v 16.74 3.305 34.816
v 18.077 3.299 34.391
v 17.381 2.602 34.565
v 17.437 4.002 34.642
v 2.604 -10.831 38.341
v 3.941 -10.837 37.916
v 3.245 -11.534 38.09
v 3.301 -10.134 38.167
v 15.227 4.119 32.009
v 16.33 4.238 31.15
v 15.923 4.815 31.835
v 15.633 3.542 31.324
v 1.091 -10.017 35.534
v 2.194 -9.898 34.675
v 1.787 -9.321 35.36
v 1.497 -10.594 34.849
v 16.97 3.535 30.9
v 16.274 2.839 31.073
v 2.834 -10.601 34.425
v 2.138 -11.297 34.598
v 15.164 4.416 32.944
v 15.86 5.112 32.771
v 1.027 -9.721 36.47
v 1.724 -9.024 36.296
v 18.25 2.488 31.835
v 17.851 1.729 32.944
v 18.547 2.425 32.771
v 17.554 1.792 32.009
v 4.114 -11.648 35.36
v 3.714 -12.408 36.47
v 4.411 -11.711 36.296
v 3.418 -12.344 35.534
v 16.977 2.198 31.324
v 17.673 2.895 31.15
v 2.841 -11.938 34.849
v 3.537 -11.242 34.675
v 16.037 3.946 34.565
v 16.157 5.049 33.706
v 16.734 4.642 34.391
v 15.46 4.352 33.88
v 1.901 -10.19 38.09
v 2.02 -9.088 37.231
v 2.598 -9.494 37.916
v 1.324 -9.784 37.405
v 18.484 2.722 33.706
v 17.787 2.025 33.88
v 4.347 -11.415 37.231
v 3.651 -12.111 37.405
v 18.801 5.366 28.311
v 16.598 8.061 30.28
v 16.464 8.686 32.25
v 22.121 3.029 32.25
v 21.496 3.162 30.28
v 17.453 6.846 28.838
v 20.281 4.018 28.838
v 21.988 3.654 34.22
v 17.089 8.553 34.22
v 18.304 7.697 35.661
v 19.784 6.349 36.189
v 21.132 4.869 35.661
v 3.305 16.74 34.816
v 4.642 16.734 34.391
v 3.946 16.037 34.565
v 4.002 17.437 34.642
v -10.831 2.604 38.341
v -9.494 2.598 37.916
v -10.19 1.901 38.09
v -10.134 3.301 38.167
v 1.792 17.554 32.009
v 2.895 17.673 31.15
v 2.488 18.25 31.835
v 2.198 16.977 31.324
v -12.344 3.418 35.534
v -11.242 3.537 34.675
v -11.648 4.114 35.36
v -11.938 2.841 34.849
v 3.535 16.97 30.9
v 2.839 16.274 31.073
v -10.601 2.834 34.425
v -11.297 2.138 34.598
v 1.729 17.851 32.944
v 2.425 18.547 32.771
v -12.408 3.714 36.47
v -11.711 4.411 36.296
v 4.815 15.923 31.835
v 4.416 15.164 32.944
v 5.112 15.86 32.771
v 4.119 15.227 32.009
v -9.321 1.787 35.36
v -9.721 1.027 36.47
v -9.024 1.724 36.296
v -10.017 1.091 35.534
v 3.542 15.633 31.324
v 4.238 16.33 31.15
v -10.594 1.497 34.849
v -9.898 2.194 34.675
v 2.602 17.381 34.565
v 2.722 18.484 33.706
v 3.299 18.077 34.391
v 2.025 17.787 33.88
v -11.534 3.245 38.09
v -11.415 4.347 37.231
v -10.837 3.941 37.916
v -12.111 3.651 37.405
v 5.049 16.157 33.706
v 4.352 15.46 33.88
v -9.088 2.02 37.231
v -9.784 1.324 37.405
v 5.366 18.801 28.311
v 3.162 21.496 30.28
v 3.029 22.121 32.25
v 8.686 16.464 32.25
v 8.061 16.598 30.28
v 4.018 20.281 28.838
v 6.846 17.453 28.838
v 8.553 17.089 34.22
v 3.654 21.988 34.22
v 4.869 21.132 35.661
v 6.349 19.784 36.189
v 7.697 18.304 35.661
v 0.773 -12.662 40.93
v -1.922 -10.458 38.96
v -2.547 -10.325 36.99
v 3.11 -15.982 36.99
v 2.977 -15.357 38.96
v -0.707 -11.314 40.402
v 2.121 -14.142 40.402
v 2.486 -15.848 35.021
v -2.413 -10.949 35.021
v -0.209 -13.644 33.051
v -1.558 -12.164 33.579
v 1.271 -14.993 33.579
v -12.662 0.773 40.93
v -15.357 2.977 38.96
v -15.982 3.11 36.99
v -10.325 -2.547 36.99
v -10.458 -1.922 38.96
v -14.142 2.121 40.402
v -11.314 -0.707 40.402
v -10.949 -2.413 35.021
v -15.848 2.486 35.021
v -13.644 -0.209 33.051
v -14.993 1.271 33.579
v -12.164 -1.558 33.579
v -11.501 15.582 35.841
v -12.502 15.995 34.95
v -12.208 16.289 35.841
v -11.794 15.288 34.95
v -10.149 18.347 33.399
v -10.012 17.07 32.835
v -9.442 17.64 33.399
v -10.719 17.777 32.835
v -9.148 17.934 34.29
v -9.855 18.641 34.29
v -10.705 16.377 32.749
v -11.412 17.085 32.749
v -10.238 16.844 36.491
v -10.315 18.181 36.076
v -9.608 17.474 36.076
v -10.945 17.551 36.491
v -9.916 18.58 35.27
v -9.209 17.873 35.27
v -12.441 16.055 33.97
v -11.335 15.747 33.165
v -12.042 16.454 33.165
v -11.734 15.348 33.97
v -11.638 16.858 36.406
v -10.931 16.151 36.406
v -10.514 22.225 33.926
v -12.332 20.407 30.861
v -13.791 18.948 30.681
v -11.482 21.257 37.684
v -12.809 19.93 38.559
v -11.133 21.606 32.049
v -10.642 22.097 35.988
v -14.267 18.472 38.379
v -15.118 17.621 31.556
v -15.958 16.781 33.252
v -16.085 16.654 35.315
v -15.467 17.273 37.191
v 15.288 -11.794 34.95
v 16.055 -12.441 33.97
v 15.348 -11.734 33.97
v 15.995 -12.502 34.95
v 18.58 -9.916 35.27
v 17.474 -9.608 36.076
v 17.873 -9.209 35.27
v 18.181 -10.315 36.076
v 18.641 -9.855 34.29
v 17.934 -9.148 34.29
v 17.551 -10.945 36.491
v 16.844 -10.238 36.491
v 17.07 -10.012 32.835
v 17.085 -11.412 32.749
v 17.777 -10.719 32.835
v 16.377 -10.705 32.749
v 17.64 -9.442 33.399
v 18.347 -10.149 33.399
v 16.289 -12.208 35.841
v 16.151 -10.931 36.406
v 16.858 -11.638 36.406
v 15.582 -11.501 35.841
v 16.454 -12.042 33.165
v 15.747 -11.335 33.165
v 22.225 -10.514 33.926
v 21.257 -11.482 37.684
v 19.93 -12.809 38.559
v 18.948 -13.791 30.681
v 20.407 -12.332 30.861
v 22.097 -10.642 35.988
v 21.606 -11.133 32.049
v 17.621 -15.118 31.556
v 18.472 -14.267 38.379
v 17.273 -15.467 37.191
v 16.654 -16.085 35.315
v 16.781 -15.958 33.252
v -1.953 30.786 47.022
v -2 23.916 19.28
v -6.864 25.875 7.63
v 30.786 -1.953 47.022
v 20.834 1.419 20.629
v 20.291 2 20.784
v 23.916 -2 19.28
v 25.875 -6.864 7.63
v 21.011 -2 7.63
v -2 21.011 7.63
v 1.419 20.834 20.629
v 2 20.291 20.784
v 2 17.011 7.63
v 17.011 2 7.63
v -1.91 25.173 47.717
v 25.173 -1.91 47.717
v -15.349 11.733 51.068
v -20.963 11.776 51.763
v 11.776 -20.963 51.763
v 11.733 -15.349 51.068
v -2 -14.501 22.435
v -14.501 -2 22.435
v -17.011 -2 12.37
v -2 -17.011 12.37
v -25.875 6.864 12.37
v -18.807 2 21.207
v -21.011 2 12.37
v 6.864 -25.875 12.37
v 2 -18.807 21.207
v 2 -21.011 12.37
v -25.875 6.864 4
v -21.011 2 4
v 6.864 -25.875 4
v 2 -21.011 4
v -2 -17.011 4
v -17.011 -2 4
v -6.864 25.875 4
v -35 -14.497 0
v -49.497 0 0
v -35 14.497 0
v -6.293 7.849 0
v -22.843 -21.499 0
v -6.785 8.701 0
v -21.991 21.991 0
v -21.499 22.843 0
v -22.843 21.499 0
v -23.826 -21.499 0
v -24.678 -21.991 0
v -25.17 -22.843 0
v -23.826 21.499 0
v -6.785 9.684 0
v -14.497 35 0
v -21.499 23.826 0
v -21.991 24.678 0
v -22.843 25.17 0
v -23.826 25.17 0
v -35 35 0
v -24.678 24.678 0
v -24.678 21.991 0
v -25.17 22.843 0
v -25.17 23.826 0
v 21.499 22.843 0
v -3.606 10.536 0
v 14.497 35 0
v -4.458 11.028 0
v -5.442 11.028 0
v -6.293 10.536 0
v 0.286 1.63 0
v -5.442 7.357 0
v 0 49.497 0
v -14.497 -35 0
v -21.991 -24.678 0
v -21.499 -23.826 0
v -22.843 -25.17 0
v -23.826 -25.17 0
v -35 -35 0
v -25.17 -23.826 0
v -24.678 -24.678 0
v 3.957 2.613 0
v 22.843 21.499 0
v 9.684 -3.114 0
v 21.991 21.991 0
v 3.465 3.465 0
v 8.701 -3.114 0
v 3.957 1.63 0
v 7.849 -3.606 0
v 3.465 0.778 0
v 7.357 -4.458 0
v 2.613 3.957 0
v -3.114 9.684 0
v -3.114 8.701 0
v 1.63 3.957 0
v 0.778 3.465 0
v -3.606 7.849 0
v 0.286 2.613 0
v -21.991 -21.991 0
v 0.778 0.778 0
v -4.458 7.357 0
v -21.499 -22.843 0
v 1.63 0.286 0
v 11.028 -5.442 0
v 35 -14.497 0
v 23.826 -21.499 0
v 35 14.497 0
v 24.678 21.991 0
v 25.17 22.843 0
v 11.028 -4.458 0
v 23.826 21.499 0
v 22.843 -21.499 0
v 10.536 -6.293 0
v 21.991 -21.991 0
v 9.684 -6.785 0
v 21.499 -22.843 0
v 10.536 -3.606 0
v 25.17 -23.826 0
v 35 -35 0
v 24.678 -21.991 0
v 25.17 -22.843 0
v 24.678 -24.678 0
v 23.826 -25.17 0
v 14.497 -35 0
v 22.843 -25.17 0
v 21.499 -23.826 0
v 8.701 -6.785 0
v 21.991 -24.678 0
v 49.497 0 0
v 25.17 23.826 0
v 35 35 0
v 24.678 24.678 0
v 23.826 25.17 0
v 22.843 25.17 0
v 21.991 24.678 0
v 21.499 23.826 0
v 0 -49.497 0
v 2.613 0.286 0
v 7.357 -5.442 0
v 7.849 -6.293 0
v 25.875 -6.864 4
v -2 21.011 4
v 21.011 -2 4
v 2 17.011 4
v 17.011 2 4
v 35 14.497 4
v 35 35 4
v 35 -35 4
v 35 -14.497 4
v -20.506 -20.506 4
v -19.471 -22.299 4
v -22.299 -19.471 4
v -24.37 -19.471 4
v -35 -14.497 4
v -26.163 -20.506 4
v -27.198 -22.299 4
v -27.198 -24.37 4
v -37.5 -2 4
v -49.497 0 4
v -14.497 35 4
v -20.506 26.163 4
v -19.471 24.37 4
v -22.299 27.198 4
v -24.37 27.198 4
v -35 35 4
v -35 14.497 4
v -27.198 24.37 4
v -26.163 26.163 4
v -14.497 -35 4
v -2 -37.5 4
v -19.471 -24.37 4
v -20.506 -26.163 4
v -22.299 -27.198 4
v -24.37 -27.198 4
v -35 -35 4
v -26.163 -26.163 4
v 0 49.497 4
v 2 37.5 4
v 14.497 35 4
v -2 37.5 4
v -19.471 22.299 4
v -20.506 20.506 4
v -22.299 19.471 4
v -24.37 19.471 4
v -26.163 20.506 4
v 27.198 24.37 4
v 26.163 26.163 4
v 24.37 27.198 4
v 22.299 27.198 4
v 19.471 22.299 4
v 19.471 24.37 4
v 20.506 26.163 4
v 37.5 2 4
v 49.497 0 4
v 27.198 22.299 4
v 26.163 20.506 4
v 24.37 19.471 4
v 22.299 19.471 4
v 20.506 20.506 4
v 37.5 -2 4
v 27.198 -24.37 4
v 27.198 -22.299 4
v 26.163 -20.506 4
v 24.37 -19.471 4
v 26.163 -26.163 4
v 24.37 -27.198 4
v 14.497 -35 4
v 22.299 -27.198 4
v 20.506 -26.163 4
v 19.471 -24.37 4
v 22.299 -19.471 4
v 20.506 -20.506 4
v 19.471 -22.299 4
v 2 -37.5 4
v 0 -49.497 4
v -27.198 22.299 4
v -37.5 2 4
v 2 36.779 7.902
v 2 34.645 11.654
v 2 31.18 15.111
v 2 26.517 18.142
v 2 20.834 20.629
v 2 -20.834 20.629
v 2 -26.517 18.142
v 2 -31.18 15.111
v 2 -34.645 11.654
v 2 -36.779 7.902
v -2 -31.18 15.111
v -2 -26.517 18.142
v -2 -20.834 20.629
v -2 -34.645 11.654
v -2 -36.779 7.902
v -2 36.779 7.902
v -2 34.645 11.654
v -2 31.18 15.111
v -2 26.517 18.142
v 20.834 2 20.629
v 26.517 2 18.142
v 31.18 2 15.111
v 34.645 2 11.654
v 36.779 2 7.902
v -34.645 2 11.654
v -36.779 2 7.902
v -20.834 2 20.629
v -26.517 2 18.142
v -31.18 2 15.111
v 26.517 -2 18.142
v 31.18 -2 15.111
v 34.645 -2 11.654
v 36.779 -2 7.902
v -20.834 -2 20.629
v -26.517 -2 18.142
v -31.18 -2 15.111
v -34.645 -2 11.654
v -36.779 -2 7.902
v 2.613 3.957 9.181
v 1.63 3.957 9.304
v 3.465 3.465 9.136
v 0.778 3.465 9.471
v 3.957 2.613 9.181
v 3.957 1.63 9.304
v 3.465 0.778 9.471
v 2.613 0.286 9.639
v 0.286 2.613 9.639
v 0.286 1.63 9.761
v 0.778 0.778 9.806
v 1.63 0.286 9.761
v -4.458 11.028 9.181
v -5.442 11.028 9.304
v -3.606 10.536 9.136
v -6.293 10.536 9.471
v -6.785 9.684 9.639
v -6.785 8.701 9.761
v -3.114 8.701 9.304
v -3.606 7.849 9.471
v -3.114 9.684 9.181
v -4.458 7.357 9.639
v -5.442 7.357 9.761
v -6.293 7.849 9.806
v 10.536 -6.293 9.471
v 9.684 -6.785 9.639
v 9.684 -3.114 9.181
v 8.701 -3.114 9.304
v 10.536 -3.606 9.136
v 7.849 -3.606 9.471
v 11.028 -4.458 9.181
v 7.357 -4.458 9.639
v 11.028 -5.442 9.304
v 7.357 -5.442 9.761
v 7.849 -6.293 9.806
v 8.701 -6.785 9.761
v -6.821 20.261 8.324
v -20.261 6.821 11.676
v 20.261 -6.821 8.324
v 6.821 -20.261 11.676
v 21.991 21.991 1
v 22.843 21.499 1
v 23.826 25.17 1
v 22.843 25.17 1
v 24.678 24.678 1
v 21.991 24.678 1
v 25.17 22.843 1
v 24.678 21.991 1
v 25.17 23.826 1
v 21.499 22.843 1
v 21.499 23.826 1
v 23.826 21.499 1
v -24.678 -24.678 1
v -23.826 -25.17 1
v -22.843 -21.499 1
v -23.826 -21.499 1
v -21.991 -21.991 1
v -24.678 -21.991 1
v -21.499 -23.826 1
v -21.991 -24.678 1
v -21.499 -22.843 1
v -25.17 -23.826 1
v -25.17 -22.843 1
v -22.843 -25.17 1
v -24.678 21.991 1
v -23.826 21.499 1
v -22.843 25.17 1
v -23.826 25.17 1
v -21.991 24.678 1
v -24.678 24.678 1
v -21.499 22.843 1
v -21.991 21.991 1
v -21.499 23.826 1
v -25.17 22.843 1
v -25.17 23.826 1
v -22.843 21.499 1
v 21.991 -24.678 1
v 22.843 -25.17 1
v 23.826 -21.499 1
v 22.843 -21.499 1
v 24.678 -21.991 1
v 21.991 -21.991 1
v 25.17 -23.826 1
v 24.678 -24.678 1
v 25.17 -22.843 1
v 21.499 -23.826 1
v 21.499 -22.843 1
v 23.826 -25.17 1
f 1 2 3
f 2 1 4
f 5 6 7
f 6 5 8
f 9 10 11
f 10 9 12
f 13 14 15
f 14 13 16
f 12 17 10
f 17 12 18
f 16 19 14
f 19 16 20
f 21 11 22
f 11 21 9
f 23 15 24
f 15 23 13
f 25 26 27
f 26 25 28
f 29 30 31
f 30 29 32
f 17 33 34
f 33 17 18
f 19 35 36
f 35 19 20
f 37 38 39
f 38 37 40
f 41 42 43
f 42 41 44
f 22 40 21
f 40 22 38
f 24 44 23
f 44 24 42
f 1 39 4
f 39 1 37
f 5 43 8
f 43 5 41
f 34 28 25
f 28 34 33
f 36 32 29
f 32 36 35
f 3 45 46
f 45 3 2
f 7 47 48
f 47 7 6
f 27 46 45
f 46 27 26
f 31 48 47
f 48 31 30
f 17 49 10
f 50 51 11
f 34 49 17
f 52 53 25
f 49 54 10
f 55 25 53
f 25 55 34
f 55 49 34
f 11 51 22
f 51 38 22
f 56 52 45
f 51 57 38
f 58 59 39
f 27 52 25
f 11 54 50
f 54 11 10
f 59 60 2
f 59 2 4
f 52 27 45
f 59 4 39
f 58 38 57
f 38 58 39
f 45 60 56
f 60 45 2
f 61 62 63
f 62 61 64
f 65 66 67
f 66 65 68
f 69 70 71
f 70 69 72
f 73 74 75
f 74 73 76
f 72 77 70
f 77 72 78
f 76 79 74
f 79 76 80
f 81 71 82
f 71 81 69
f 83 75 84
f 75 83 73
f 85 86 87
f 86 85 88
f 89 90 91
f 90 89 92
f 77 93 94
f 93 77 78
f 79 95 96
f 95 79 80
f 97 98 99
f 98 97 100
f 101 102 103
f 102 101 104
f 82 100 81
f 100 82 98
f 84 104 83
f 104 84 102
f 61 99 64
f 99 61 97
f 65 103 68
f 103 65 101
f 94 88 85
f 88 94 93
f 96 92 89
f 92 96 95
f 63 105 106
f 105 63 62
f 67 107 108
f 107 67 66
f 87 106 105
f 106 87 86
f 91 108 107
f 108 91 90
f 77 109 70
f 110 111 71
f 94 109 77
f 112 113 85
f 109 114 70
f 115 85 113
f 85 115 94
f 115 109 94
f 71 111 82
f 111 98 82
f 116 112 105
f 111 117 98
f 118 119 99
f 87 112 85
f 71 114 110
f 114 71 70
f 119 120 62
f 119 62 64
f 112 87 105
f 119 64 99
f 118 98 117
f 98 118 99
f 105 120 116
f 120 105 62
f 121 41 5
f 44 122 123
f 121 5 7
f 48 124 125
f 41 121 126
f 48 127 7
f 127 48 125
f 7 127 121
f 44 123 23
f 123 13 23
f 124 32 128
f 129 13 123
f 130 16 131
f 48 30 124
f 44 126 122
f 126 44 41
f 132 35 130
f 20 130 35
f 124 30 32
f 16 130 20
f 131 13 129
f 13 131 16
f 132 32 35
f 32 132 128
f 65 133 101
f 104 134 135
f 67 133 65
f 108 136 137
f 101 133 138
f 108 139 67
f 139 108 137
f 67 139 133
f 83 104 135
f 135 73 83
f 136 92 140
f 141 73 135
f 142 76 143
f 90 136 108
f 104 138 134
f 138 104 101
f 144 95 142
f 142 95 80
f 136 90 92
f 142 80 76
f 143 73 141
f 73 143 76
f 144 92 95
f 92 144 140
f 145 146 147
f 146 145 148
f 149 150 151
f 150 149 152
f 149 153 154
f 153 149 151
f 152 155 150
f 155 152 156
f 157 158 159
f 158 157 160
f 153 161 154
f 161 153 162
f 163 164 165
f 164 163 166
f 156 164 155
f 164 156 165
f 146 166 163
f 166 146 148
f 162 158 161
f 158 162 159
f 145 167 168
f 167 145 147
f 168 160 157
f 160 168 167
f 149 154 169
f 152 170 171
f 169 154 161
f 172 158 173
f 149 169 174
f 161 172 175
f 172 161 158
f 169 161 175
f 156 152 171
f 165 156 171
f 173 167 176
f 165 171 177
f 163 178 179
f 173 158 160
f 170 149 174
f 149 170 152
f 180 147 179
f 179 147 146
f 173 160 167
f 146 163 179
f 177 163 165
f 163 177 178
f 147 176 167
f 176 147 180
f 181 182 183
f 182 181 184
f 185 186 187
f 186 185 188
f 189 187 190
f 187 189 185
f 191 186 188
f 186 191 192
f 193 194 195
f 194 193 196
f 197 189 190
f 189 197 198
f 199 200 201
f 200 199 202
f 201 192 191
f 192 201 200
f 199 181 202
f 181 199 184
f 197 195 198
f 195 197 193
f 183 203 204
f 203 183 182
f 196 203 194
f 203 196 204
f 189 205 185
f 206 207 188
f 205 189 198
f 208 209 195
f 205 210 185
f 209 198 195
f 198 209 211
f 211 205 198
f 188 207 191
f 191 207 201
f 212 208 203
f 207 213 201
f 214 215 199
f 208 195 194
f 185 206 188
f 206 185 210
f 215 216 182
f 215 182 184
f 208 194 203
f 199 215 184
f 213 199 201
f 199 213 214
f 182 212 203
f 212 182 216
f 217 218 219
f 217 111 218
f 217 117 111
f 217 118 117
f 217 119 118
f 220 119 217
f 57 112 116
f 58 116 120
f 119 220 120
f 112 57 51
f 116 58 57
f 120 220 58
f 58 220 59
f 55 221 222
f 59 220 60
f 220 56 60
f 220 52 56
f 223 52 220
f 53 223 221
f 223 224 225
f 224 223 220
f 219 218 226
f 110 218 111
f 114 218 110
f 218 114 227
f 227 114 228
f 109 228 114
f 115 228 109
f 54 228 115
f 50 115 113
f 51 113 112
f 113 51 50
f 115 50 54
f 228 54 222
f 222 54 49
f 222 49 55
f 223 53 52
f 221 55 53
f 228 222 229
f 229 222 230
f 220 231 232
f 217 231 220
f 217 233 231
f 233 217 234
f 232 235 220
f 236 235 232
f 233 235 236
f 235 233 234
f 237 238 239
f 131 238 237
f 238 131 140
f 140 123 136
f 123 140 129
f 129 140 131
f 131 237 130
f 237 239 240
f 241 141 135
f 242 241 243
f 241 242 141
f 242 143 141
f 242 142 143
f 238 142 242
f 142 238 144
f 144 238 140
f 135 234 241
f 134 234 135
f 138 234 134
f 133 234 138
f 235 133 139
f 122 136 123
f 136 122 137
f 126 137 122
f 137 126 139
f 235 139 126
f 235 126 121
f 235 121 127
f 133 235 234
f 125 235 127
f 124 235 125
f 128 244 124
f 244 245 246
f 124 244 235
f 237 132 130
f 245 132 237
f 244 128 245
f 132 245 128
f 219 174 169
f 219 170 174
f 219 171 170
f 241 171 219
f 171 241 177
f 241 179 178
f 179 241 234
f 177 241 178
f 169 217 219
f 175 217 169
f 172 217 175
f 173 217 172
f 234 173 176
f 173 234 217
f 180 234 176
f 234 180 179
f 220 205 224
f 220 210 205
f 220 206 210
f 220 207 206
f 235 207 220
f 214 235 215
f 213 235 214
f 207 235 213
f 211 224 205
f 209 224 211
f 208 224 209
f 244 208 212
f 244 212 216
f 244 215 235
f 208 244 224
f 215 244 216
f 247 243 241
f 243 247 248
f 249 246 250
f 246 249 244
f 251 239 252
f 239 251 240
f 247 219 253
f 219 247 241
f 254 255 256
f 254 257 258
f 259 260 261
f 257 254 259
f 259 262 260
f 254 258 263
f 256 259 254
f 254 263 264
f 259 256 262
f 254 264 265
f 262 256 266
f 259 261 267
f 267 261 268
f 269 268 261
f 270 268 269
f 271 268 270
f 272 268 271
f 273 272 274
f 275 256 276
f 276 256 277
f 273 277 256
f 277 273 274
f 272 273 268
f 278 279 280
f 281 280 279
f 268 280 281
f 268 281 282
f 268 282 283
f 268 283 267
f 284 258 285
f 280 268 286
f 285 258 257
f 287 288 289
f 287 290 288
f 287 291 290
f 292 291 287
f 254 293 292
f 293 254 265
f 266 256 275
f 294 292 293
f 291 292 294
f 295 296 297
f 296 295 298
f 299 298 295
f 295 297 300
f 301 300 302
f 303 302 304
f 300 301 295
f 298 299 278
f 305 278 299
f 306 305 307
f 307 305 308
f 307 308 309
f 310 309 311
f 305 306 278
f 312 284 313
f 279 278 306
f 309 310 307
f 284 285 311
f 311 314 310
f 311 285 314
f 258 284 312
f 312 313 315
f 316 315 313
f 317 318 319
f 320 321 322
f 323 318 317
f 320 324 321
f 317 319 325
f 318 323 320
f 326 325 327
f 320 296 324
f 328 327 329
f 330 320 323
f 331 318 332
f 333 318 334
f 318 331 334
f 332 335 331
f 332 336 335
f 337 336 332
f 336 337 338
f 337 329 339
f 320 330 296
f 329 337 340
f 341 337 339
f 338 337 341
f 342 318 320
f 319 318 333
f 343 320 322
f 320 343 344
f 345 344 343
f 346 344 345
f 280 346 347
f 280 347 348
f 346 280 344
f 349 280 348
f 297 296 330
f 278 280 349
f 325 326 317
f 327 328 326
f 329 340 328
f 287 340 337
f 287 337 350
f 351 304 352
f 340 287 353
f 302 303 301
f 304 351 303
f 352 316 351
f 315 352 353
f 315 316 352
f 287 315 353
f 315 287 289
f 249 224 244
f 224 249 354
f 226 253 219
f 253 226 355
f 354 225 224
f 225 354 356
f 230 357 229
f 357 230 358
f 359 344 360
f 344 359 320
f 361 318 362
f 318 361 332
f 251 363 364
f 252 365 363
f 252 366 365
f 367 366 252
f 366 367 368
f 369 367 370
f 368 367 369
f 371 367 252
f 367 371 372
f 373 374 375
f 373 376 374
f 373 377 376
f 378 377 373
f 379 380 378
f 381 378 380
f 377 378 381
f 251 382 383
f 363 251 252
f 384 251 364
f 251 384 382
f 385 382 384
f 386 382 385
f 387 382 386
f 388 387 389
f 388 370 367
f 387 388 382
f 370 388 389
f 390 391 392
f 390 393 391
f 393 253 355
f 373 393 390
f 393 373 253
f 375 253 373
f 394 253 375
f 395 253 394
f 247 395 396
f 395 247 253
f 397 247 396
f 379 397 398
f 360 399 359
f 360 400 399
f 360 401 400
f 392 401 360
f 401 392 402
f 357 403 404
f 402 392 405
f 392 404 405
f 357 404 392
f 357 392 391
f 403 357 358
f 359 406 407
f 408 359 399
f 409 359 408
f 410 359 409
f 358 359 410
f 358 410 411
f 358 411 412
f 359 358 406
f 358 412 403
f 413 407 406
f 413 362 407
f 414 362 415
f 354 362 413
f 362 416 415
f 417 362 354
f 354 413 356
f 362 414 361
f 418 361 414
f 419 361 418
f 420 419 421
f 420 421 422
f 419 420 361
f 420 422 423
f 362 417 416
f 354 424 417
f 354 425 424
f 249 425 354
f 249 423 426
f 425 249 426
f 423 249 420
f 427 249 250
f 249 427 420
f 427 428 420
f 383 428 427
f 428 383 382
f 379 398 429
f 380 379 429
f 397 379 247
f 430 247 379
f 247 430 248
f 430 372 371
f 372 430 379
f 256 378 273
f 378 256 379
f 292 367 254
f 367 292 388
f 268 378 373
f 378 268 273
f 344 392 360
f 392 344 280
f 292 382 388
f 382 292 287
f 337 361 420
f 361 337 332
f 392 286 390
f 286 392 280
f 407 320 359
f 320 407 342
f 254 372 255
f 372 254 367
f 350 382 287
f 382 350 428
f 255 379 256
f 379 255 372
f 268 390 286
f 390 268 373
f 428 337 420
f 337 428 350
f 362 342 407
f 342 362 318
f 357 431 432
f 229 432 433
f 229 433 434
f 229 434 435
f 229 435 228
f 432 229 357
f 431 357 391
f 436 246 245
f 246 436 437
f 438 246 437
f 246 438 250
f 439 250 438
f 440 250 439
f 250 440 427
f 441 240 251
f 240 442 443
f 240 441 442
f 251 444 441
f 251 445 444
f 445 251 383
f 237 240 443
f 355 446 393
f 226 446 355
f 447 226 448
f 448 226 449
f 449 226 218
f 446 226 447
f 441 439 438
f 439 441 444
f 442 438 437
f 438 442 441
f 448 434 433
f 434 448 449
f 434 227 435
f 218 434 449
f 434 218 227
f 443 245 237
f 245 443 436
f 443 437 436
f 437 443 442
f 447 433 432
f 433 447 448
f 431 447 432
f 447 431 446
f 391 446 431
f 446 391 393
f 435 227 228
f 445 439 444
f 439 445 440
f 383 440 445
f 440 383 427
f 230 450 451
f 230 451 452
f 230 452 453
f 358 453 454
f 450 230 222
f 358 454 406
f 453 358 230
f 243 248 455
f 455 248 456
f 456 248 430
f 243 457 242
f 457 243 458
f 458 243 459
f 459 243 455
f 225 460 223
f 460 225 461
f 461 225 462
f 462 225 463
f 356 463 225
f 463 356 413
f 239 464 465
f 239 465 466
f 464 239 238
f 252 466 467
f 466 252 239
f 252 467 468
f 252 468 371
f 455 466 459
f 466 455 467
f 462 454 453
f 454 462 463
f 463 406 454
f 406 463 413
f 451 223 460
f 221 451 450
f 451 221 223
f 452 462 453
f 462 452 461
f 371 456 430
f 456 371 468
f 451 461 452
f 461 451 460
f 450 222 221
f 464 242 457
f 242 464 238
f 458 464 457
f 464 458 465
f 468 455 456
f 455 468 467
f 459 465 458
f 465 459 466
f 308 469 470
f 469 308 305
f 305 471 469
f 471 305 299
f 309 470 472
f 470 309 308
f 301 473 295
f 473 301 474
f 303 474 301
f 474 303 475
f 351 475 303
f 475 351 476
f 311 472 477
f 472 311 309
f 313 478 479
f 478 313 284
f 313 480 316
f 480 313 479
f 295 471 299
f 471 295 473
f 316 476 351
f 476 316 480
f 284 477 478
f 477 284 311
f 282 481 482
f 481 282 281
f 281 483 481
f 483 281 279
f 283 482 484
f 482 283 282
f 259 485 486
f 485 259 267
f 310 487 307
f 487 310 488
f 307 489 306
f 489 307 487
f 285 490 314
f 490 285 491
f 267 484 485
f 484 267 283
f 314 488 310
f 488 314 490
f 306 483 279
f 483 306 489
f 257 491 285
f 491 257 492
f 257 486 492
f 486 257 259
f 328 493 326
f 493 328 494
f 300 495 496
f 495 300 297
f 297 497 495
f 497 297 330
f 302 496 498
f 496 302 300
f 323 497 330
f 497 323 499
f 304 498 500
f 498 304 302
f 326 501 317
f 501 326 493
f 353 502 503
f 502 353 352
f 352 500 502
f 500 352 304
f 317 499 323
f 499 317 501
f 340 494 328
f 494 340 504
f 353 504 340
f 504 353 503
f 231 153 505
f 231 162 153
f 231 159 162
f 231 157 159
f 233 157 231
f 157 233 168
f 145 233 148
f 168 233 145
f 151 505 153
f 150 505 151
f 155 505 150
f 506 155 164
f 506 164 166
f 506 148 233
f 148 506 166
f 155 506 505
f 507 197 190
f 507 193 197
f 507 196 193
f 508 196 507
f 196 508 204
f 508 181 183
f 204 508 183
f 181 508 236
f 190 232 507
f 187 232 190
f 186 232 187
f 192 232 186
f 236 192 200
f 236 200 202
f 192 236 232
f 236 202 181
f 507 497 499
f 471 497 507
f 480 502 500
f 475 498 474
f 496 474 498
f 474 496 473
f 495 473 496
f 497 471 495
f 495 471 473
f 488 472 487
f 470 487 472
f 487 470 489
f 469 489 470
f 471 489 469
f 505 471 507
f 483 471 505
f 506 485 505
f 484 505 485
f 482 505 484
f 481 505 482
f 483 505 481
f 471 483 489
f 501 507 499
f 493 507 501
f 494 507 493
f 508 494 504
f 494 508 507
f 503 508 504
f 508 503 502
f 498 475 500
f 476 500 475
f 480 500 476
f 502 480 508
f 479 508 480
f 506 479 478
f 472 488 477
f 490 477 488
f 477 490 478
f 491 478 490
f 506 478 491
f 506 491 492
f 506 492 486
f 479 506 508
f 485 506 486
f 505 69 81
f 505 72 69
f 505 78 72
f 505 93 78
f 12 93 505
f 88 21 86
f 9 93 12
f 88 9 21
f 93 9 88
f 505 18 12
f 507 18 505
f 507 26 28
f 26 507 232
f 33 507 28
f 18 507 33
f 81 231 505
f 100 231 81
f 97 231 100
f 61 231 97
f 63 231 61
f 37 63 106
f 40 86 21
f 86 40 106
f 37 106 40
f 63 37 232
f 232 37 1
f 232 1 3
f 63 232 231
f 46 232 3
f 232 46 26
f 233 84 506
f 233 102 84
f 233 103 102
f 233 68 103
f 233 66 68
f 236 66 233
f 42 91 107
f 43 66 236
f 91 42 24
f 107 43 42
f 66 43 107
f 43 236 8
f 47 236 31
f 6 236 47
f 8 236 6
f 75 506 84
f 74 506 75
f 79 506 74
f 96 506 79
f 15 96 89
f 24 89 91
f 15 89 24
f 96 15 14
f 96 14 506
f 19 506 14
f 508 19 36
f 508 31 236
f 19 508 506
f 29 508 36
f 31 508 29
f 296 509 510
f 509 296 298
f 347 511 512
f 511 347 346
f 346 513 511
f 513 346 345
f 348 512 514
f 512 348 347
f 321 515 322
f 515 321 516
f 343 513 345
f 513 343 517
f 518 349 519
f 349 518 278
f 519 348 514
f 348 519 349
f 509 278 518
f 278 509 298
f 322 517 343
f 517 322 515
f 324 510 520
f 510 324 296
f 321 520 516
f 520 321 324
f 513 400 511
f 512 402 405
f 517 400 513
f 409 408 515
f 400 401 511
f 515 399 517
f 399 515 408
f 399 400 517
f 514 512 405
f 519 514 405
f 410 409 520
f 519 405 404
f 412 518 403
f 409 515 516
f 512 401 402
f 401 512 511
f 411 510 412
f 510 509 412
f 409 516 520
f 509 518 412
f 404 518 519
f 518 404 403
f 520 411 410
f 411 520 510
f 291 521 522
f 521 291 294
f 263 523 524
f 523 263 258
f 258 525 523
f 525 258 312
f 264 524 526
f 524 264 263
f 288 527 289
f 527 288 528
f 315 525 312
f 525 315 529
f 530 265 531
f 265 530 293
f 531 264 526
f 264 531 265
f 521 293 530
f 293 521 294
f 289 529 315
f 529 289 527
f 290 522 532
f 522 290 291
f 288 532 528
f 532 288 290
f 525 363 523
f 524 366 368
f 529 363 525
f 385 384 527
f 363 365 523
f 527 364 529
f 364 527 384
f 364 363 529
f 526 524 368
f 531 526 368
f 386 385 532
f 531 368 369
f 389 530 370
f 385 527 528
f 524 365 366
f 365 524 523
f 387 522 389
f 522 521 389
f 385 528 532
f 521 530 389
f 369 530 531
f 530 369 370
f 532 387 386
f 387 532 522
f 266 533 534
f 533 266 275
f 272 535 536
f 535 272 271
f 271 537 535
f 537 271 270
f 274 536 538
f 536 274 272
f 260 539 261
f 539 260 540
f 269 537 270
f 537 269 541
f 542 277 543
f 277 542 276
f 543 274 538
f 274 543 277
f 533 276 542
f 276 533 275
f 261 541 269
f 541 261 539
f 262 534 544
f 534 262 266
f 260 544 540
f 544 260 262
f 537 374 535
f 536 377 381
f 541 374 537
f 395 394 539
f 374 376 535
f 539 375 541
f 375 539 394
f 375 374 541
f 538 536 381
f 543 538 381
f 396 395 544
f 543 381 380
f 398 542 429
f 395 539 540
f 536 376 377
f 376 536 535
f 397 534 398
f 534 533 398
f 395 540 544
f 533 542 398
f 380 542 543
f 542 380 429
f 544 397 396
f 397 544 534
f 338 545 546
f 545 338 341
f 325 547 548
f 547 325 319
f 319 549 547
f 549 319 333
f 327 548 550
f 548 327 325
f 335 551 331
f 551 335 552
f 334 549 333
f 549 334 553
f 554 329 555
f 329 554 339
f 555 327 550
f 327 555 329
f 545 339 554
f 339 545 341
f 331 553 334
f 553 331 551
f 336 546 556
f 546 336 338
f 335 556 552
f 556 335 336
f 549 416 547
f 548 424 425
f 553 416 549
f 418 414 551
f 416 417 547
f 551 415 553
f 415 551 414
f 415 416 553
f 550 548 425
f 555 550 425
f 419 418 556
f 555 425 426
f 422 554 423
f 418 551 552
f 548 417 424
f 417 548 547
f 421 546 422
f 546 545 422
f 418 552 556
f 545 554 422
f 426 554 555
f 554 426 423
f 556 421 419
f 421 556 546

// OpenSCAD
union() {
	difference() {
		union() {
			union() {
				union() {
					translate(v = [0, 0, 10]) {
						rotate(a = 45, v = [0, 0, 1]) {
							rotate(a = 10, v = [0, 1, 0]) {
								difference() {
									translate(v = [-13.6500000000, -23.1500000000, 0]) {
										cube(size = [27.3000000000, 46.3000000000, 40]);
									}
									union() {
										translate(v = [9.6500000000, -9.5000000000, 25]) {
											rotate(a = 90, v = [0, 1, 0]) {
												union() {
													union() {
														translate(v = [0, 0, -12]) {
															cylinder($fn = 12, h = 16, r = 1.9000000000);
														}
														translate(v = [0, 0, 1]) {
															cylinder($fn = 12, h = 3, r1 = 1.9000000000, r2 = 4);
														}
													}
													translate(v = [0, 0, 4]) {
														cylinder($fn = 12, h = 3, r = 4);
													}
												}
											}
										}
										translate(v = [9.6500000000, 9.5000000000, 25]) {
											rotate(a = 90, v = [0, 1, 0]) {
												union() {
													union() {
														translate(v = [0, 0, -12]) {
															cylinder($fn = 12, h = 16, r = 1.9000000000);
														}
														translate(v = [0, 0, 1]) {
															cylinder($fn = 12, h = 3, r1 = 1.9000000000, r2 = 4);
														}
													}
													translate(v = [0, 0, 4]) {
														cylinder($fn = 12, h = 3, r = 4);
													}
												}
											}
										}
										translate(v = [-9.6500000000, -9.5000000000, 25]) {
											rotate(a = -90, v = [0, 1, 0]) {
												union() {
													union() {
														translate(v = [0, 0, -12]) {
															cylinder($fn = 12, h = 16, r = 1.9000000000);
														}
														translate(v = [0, 0, 1]) {
															cylinder($fn = 12, h = 3, r1 = 1.9000000000, r2 = 4);
														}
													}
													translate(v = [0, 0, 4]) {
														cylinder($fn = 12, h = 3, r = 4);
													}
												}
											}
										}
										translate(v = [-9.6500000000, 9.5000000000, 25]) {
											rotate(a = -90, v = [0, 1, 0]) {
												union() {
													union() {
														translate(v = [0, 0, -12]) {
															cylinder($fn = 12, h = 16, r = 1.9000000000);
														}
														translate(v = [0, 0, 1]) {
															cylinder($fn = 12, h = 3, r1 = 1.9000000000, r2 = 4);
														}
													}
													translate(v = [0, 0, 4]) {
														cylinder($fn = 12, h = 3, r = 4);
													}
												}
											}
										}
										translate(v = [0, 19.1500000000, 25]) {
											rotate(a = -90, v = [1, 0, 0]) {
												union() {
													union() {
														translate(v = [0, 0, -12]) {
															cylinder($fn = 12, h = 16, r = 1.9000000000);
														}
														translate(v = [0, 0, 1]) {
															cylinder($fn = 12, h = 3, r1 = 1.9000000000, r2 = 4);
														}
													}
													translate(v = [0, 0, 4]) {
														cylinder($fn = 12, h = 3, r = 4);
													}
												}
											}
										}
										translate(v = [0, -19.1500000000, 25]) {
											rotate(a = 90, v = [1, 0, 0]) {
												union() {
													union() {
														translate(v = [0, 0, -12]) {
															cylinder($fn = 12, h = 16, r = 1.9000000000);
														}
														translate(v = [0, 0, 1]) {
															cylinder($fn = 12, h = 3, r1 = 1.9000000000, r2 = 4);
														}
													}
													translate(v = [0, 0, 4]) {
														cylinder($fn = 12, h = 3, r = 4);
													}
												}
											}
										}
									}
								}
							}
						}
					}
					translate(v = [0, 0, 0]) {
						rotate(a = 45, v = [0, 0, 1]) {
							translate(v = [-13.4426258286, -23.1500000000, 0]) {
								cube(size = [26.8852516572, 46.3000000000, 12.3702976252]);
							}
						}
					}
				}
				union() {
					translate(v = [-35.0000000000, -35.0000000000, 0]) {
						cube(size = [70, 70, 4]);
					}
					rotate(a = 45, v = [0, 0, 1]) {
						translate(v = [-35.0000000000, -35.0000000000, 0]) {
							cube(size = [70, 70, 4]);
						}
					}
				}
			}
			union() {
				translate(v = [0, 0, 4]) {
					intersection() {
						translate(v = [-2.0000000000, -37.5000000000, 0]) {
							cube(size = [4, 75, 20]);
						}
						rotate(a = 90, v = [0, 1, 0]) {
							translate(v = [0, 0, -2.0000000000]) {
								scale(v = [20, 37.5000000000, 1]) {
									cylinder($fn = 32, h = 4, r = 1);
								}
							}
						}
					}
				}
				translate(v = [0, 0, 4]) {
					intersection() {
						translate(v = [-37.5000000000, -2.0000000000, 0]) {
							cube(size = [75, 4, 20]);
						}
						rotate(a = 90, v = [1, 0, 0]) {
							translate(v = [0, 0, -2.0000000000]) {
								scale(v = [37.5000000000, 20, 1]) {
									cylinder($fn = 32, h = 4, r = 1);
								}
							}
						}
					}
				}
			}
		}
		union() {
			union() {
				translate(v = [0, 0, 10]) {
					rotate(a = 45, v = [0, 0, 1]) {
						rotate(a = 10, v = [0, 1, 0]) {
							translate(v = [-9.6500000000, -19.1500000000, 0]) {
								cube(size = [19.3000000000, 38.3000000000, 41]);
							}
						}
					}
				}
				rotate(a = 45, v = [0, 0, 1]) {
					translate(v = [3, 0, -1]) {
						cylinder($fn = 12, h = 30, r = 1.9000000000);
					}
					translate(v = [3, 10, -1]) {
						cylinder($fn = 12, h = 30, r = 1.9000000000);
					}
					translate(v = [3, -10, -1]) {
						cylinder($fn = 12, h = 30, r = 1.9000000000);
					}
				}
			}
			rotate(a = 45, v = [0, 0, 1]) {
				translate(v = [33.0000000000, 0, 0]) {
					union() {
						union() {
							translate(v = [0, 0, -12]) {
								cylinder($fn = 12, h = 16, r = 1.9000000000);
							}
							translate(v = [0, 0, 1]) {
								cylinder($fn = 12, h = 3, r1 = 1.9000000000, r2 = 4);
							}
						}
						translate(v = [0, 0, 4]) {
							cylinder($fn = 12, h = 3, r = 4);
						}
					}
				}
				translate(v = [-33.0000000000, 0, 0]) {
					union() {
						union() {
							translate(v = [0, 0, -12]) {
								cylinder($fn = 12, h = 16, r = 1.9000000000);
							}
							translate(v = [0, 0, 1]) {
								cylinder($fn = 12, h = 3, r1 = 1.9000000000, r2 = 4);
							}
						}
						translate(v = [0, 0, 4]) {
							cylinder($fn = 12, h = 3, r = 4);
						}
					}
				}
				translate(v = [0, 33.0000000000, 0]) {
					union() {
						union() {
							translate(v = [0, 0, -12]) {
								cylinder($fn = 12, h = 16, r = 1.9000000000);
							}
							translate(v = [0, 0, 1]) {
								cylinder($fn = 12, h = 3, r1 = 1.9000000000, r2 = 4);
							}
						}
						translate(v = [0, 0, 4]) {
							cylinder($fn = 12, h = 3, r = 4);
						}
					}
				}
				translate(v = [0, -33.0000000000, 0]) {
					union() {
						union() {
							translate(v = [0, 0, -12]) {
								cylinder($fn = 12, h = 16, r = 1.9000000000);
							}
							translate(v = [0, 0, 1]) {
								cylinder($fn = 12, h = 3, r1 = 1.9000000000, r2 = 4);
							}
						}
						translate(v = [0, 0, 4]) {
							cylinder($fn = 12, h = 3, r = 4);
						}
					}
				}
			}
		}
	}
}
